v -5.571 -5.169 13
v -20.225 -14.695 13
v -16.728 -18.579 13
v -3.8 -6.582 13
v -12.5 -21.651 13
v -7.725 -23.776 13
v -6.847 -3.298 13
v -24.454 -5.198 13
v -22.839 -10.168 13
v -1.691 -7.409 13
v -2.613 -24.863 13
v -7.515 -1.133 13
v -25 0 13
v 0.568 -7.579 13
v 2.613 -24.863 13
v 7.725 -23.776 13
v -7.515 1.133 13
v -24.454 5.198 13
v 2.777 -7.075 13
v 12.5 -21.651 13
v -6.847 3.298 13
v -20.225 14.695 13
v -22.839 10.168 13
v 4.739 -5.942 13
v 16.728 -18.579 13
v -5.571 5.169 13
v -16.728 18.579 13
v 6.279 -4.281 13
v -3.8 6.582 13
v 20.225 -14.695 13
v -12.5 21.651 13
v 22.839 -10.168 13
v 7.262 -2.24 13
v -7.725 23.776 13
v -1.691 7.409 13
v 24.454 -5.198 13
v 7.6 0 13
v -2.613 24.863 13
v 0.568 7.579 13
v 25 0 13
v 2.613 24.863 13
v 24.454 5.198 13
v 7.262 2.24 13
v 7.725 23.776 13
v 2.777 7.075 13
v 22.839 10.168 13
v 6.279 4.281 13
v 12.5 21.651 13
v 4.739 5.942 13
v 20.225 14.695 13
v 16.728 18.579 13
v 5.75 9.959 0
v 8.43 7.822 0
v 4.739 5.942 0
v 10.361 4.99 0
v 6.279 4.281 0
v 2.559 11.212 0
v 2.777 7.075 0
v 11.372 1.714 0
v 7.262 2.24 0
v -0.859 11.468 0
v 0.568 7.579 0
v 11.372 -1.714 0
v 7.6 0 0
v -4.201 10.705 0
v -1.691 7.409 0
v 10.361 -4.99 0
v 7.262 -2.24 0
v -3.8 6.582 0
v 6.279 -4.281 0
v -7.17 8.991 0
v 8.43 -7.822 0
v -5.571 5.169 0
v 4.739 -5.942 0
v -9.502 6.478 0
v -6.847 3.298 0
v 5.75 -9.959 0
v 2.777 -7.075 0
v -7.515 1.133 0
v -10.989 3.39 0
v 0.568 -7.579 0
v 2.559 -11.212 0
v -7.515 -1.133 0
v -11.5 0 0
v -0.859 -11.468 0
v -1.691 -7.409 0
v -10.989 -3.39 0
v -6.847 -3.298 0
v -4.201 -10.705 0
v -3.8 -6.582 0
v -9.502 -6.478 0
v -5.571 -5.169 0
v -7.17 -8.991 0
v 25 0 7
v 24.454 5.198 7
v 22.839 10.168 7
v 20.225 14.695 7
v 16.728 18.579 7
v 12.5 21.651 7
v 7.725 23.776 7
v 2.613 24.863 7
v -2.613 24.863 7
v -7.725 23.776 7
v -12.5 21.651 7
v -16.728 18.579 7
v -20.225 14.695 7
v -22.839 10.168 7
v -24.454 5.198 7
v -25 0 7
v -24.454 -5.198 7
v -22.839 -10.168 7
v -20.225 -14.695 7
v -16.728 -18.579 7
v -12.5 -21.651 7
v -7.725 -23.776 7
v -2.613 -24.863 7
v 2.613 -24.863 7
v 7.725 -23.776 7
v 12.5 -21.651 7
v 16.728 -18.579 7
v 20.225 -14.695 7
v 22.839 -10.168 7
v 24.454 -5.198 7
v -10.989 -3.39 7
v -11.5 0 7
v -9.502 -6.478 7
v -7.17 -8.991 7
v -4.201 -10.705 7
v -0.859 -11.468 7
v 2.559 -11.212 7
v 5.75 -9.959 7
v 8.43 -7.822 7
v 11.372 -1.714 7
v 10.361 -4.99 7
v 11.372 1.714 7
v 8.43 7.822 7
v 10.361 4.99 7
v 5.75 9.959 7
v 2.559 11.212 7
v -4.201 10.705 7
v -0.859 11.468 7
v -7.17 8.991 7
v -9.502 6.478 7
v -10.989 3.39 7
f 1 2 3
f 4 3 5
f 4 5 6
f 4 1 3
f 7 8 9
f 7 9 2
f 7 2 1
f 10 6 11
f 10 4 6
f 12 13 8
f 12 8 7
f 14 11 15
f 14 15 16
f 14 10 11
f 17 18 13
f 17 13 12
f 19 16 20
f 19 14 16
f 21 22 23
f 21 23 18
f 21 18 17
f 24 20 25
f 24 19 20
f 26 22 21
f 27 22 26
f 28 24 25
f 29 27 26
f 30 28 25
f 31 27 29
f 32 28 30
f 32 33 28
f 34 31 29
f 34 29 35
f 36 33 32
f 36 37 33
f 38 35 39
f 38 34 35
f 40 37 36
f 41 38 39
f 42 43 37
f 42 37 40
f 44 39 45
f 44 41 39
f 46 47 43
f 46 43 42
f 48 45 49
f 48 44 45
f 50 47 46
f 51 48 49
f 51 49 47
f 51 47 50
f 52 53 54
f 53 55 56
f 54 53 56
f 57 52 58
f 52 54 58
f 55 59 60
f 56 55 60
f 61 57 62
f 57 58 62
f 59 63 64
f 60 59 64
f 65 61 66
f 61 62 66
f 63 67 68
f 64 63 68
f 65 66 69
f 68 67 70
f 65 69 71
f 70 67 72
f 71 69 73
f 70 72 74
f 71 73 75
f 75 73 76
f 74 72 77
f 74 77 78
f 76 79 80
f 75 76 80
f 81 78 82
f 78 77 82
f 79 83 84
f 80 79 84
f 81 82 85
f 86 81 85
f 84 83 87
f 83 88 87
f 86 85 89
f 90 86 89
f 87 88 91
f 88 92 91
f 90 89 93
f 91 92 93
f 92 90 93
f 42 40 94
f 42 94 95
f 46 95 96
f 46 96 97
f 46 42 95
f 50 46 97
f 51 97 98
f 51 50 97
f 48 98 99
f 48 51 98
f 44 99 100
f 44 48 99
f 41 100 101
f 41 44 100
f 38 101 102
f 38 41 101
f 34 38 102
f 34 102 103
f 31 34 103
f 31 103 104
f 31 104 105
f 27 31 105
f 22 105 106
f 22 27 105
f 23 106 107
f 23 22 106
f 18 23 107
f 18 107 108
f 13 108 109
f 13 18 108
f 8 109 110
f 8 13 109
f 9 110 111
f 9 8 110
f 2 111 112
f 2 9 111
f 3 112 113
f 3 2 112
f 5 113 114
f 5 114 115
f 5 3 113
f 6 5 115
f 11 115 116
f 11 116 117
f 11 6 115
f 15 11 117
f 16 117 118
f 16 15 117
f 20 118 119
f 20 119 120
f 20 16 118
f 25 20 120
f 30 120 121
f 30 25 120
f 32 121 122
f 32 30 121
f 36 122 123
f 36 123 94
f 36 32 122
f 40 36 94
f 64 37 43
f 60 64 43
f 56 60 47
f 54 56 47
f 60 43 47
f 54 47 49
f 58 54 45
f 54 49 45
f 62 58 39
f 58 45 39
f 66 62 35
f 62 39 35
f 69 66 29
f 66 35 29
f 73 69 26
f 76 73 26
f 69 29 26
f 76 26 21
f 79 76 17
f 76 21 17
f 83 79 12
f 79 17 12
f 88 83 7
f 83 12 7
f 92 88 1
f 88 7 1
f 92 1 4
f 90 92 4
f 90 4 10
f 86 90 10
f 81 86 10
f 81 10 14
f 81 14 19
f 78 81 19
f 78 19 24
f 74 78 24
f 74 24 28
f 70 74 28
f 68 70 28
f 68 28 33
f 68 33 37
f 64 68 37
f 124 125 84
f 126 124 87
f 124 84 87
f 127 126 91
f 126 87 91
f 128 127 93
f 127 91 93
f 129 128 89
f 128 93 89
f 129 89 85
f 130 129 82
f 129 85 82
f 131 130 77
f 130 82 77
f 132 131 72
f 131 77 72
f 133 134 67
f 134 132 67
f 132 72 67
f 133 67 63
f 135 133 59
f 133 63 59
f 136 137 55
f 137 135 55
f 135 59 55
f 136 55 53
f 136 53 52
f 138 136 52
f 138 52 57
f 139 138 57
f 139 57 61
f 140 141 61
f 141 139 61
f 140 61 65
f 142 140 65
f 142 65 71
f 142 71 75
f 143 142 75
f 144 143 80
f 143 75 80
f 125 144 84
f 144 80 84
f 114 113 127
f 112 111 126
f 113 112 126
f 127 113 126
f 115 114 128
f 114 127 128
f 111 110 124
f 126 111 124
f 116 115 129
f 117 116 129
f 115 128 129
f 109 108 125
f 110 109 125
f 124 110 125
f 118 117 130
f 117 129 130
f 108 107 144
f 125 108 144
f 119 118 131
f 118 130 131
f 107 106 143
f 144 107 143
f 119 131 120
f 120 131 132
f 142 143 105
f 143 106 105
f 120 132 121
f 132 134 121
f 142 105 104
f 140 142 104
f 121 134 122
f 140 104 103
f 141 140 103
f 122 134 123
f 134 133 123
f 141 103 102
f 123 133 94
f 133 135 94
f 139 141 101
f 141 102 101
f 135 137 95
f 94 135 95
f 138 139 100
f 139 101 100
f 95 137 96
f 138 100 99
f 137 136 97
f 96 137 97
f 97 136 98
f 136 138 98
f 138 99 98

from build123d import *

# Parameters (mm, degrees)
ESQUISSE1_R             = 11.5
BOSS_EXTRU_1_DEPTH      = 13
ESQUISSE2_R             = 25
ESQUISSE2_R_2           = 7.5
BOSS_EXTRU_2_DEPTH      = 6
ESQUISSE5_R             = 7.6
ENL_V_MAT_EXTRU_1_DEPTH = 38.669616404


with BuildPart() as part:
    # Esquisse1 → Boss.-Extru.1 (new body)
    with BuildSketch(Plane.XY):
        with Locations(Location((0, 0, 0), (0, 0, 180))):
            Circle(ESQUISSE1_R)
    extrude(amount=BOSS_EXTRU_1_DEPTH)

    # Esquisse2 → Boss.-Extru.2 (add)
    with BuildSketch(Plane.XY.offset(13)):
        Circle(ESQUISSE2_R)
        Circle(ESQUISSE2_R_2, mode=Mode.SUBTRACT)
    extrude(amount=-BOSS_EXTRU_2_DEPTH)

    # Esquisse5 → Enlèv. mat.-Extru.1 (cut, through all)
    with BuildSketch(Plane.XY.offset(13)):
        Circle(ESQUISSE5_R)
    extrude(amount=-ENL_V_MAT_EXTRU_1_DEPTH, mode=Mode.SUBTRACT)


solid = part.part
